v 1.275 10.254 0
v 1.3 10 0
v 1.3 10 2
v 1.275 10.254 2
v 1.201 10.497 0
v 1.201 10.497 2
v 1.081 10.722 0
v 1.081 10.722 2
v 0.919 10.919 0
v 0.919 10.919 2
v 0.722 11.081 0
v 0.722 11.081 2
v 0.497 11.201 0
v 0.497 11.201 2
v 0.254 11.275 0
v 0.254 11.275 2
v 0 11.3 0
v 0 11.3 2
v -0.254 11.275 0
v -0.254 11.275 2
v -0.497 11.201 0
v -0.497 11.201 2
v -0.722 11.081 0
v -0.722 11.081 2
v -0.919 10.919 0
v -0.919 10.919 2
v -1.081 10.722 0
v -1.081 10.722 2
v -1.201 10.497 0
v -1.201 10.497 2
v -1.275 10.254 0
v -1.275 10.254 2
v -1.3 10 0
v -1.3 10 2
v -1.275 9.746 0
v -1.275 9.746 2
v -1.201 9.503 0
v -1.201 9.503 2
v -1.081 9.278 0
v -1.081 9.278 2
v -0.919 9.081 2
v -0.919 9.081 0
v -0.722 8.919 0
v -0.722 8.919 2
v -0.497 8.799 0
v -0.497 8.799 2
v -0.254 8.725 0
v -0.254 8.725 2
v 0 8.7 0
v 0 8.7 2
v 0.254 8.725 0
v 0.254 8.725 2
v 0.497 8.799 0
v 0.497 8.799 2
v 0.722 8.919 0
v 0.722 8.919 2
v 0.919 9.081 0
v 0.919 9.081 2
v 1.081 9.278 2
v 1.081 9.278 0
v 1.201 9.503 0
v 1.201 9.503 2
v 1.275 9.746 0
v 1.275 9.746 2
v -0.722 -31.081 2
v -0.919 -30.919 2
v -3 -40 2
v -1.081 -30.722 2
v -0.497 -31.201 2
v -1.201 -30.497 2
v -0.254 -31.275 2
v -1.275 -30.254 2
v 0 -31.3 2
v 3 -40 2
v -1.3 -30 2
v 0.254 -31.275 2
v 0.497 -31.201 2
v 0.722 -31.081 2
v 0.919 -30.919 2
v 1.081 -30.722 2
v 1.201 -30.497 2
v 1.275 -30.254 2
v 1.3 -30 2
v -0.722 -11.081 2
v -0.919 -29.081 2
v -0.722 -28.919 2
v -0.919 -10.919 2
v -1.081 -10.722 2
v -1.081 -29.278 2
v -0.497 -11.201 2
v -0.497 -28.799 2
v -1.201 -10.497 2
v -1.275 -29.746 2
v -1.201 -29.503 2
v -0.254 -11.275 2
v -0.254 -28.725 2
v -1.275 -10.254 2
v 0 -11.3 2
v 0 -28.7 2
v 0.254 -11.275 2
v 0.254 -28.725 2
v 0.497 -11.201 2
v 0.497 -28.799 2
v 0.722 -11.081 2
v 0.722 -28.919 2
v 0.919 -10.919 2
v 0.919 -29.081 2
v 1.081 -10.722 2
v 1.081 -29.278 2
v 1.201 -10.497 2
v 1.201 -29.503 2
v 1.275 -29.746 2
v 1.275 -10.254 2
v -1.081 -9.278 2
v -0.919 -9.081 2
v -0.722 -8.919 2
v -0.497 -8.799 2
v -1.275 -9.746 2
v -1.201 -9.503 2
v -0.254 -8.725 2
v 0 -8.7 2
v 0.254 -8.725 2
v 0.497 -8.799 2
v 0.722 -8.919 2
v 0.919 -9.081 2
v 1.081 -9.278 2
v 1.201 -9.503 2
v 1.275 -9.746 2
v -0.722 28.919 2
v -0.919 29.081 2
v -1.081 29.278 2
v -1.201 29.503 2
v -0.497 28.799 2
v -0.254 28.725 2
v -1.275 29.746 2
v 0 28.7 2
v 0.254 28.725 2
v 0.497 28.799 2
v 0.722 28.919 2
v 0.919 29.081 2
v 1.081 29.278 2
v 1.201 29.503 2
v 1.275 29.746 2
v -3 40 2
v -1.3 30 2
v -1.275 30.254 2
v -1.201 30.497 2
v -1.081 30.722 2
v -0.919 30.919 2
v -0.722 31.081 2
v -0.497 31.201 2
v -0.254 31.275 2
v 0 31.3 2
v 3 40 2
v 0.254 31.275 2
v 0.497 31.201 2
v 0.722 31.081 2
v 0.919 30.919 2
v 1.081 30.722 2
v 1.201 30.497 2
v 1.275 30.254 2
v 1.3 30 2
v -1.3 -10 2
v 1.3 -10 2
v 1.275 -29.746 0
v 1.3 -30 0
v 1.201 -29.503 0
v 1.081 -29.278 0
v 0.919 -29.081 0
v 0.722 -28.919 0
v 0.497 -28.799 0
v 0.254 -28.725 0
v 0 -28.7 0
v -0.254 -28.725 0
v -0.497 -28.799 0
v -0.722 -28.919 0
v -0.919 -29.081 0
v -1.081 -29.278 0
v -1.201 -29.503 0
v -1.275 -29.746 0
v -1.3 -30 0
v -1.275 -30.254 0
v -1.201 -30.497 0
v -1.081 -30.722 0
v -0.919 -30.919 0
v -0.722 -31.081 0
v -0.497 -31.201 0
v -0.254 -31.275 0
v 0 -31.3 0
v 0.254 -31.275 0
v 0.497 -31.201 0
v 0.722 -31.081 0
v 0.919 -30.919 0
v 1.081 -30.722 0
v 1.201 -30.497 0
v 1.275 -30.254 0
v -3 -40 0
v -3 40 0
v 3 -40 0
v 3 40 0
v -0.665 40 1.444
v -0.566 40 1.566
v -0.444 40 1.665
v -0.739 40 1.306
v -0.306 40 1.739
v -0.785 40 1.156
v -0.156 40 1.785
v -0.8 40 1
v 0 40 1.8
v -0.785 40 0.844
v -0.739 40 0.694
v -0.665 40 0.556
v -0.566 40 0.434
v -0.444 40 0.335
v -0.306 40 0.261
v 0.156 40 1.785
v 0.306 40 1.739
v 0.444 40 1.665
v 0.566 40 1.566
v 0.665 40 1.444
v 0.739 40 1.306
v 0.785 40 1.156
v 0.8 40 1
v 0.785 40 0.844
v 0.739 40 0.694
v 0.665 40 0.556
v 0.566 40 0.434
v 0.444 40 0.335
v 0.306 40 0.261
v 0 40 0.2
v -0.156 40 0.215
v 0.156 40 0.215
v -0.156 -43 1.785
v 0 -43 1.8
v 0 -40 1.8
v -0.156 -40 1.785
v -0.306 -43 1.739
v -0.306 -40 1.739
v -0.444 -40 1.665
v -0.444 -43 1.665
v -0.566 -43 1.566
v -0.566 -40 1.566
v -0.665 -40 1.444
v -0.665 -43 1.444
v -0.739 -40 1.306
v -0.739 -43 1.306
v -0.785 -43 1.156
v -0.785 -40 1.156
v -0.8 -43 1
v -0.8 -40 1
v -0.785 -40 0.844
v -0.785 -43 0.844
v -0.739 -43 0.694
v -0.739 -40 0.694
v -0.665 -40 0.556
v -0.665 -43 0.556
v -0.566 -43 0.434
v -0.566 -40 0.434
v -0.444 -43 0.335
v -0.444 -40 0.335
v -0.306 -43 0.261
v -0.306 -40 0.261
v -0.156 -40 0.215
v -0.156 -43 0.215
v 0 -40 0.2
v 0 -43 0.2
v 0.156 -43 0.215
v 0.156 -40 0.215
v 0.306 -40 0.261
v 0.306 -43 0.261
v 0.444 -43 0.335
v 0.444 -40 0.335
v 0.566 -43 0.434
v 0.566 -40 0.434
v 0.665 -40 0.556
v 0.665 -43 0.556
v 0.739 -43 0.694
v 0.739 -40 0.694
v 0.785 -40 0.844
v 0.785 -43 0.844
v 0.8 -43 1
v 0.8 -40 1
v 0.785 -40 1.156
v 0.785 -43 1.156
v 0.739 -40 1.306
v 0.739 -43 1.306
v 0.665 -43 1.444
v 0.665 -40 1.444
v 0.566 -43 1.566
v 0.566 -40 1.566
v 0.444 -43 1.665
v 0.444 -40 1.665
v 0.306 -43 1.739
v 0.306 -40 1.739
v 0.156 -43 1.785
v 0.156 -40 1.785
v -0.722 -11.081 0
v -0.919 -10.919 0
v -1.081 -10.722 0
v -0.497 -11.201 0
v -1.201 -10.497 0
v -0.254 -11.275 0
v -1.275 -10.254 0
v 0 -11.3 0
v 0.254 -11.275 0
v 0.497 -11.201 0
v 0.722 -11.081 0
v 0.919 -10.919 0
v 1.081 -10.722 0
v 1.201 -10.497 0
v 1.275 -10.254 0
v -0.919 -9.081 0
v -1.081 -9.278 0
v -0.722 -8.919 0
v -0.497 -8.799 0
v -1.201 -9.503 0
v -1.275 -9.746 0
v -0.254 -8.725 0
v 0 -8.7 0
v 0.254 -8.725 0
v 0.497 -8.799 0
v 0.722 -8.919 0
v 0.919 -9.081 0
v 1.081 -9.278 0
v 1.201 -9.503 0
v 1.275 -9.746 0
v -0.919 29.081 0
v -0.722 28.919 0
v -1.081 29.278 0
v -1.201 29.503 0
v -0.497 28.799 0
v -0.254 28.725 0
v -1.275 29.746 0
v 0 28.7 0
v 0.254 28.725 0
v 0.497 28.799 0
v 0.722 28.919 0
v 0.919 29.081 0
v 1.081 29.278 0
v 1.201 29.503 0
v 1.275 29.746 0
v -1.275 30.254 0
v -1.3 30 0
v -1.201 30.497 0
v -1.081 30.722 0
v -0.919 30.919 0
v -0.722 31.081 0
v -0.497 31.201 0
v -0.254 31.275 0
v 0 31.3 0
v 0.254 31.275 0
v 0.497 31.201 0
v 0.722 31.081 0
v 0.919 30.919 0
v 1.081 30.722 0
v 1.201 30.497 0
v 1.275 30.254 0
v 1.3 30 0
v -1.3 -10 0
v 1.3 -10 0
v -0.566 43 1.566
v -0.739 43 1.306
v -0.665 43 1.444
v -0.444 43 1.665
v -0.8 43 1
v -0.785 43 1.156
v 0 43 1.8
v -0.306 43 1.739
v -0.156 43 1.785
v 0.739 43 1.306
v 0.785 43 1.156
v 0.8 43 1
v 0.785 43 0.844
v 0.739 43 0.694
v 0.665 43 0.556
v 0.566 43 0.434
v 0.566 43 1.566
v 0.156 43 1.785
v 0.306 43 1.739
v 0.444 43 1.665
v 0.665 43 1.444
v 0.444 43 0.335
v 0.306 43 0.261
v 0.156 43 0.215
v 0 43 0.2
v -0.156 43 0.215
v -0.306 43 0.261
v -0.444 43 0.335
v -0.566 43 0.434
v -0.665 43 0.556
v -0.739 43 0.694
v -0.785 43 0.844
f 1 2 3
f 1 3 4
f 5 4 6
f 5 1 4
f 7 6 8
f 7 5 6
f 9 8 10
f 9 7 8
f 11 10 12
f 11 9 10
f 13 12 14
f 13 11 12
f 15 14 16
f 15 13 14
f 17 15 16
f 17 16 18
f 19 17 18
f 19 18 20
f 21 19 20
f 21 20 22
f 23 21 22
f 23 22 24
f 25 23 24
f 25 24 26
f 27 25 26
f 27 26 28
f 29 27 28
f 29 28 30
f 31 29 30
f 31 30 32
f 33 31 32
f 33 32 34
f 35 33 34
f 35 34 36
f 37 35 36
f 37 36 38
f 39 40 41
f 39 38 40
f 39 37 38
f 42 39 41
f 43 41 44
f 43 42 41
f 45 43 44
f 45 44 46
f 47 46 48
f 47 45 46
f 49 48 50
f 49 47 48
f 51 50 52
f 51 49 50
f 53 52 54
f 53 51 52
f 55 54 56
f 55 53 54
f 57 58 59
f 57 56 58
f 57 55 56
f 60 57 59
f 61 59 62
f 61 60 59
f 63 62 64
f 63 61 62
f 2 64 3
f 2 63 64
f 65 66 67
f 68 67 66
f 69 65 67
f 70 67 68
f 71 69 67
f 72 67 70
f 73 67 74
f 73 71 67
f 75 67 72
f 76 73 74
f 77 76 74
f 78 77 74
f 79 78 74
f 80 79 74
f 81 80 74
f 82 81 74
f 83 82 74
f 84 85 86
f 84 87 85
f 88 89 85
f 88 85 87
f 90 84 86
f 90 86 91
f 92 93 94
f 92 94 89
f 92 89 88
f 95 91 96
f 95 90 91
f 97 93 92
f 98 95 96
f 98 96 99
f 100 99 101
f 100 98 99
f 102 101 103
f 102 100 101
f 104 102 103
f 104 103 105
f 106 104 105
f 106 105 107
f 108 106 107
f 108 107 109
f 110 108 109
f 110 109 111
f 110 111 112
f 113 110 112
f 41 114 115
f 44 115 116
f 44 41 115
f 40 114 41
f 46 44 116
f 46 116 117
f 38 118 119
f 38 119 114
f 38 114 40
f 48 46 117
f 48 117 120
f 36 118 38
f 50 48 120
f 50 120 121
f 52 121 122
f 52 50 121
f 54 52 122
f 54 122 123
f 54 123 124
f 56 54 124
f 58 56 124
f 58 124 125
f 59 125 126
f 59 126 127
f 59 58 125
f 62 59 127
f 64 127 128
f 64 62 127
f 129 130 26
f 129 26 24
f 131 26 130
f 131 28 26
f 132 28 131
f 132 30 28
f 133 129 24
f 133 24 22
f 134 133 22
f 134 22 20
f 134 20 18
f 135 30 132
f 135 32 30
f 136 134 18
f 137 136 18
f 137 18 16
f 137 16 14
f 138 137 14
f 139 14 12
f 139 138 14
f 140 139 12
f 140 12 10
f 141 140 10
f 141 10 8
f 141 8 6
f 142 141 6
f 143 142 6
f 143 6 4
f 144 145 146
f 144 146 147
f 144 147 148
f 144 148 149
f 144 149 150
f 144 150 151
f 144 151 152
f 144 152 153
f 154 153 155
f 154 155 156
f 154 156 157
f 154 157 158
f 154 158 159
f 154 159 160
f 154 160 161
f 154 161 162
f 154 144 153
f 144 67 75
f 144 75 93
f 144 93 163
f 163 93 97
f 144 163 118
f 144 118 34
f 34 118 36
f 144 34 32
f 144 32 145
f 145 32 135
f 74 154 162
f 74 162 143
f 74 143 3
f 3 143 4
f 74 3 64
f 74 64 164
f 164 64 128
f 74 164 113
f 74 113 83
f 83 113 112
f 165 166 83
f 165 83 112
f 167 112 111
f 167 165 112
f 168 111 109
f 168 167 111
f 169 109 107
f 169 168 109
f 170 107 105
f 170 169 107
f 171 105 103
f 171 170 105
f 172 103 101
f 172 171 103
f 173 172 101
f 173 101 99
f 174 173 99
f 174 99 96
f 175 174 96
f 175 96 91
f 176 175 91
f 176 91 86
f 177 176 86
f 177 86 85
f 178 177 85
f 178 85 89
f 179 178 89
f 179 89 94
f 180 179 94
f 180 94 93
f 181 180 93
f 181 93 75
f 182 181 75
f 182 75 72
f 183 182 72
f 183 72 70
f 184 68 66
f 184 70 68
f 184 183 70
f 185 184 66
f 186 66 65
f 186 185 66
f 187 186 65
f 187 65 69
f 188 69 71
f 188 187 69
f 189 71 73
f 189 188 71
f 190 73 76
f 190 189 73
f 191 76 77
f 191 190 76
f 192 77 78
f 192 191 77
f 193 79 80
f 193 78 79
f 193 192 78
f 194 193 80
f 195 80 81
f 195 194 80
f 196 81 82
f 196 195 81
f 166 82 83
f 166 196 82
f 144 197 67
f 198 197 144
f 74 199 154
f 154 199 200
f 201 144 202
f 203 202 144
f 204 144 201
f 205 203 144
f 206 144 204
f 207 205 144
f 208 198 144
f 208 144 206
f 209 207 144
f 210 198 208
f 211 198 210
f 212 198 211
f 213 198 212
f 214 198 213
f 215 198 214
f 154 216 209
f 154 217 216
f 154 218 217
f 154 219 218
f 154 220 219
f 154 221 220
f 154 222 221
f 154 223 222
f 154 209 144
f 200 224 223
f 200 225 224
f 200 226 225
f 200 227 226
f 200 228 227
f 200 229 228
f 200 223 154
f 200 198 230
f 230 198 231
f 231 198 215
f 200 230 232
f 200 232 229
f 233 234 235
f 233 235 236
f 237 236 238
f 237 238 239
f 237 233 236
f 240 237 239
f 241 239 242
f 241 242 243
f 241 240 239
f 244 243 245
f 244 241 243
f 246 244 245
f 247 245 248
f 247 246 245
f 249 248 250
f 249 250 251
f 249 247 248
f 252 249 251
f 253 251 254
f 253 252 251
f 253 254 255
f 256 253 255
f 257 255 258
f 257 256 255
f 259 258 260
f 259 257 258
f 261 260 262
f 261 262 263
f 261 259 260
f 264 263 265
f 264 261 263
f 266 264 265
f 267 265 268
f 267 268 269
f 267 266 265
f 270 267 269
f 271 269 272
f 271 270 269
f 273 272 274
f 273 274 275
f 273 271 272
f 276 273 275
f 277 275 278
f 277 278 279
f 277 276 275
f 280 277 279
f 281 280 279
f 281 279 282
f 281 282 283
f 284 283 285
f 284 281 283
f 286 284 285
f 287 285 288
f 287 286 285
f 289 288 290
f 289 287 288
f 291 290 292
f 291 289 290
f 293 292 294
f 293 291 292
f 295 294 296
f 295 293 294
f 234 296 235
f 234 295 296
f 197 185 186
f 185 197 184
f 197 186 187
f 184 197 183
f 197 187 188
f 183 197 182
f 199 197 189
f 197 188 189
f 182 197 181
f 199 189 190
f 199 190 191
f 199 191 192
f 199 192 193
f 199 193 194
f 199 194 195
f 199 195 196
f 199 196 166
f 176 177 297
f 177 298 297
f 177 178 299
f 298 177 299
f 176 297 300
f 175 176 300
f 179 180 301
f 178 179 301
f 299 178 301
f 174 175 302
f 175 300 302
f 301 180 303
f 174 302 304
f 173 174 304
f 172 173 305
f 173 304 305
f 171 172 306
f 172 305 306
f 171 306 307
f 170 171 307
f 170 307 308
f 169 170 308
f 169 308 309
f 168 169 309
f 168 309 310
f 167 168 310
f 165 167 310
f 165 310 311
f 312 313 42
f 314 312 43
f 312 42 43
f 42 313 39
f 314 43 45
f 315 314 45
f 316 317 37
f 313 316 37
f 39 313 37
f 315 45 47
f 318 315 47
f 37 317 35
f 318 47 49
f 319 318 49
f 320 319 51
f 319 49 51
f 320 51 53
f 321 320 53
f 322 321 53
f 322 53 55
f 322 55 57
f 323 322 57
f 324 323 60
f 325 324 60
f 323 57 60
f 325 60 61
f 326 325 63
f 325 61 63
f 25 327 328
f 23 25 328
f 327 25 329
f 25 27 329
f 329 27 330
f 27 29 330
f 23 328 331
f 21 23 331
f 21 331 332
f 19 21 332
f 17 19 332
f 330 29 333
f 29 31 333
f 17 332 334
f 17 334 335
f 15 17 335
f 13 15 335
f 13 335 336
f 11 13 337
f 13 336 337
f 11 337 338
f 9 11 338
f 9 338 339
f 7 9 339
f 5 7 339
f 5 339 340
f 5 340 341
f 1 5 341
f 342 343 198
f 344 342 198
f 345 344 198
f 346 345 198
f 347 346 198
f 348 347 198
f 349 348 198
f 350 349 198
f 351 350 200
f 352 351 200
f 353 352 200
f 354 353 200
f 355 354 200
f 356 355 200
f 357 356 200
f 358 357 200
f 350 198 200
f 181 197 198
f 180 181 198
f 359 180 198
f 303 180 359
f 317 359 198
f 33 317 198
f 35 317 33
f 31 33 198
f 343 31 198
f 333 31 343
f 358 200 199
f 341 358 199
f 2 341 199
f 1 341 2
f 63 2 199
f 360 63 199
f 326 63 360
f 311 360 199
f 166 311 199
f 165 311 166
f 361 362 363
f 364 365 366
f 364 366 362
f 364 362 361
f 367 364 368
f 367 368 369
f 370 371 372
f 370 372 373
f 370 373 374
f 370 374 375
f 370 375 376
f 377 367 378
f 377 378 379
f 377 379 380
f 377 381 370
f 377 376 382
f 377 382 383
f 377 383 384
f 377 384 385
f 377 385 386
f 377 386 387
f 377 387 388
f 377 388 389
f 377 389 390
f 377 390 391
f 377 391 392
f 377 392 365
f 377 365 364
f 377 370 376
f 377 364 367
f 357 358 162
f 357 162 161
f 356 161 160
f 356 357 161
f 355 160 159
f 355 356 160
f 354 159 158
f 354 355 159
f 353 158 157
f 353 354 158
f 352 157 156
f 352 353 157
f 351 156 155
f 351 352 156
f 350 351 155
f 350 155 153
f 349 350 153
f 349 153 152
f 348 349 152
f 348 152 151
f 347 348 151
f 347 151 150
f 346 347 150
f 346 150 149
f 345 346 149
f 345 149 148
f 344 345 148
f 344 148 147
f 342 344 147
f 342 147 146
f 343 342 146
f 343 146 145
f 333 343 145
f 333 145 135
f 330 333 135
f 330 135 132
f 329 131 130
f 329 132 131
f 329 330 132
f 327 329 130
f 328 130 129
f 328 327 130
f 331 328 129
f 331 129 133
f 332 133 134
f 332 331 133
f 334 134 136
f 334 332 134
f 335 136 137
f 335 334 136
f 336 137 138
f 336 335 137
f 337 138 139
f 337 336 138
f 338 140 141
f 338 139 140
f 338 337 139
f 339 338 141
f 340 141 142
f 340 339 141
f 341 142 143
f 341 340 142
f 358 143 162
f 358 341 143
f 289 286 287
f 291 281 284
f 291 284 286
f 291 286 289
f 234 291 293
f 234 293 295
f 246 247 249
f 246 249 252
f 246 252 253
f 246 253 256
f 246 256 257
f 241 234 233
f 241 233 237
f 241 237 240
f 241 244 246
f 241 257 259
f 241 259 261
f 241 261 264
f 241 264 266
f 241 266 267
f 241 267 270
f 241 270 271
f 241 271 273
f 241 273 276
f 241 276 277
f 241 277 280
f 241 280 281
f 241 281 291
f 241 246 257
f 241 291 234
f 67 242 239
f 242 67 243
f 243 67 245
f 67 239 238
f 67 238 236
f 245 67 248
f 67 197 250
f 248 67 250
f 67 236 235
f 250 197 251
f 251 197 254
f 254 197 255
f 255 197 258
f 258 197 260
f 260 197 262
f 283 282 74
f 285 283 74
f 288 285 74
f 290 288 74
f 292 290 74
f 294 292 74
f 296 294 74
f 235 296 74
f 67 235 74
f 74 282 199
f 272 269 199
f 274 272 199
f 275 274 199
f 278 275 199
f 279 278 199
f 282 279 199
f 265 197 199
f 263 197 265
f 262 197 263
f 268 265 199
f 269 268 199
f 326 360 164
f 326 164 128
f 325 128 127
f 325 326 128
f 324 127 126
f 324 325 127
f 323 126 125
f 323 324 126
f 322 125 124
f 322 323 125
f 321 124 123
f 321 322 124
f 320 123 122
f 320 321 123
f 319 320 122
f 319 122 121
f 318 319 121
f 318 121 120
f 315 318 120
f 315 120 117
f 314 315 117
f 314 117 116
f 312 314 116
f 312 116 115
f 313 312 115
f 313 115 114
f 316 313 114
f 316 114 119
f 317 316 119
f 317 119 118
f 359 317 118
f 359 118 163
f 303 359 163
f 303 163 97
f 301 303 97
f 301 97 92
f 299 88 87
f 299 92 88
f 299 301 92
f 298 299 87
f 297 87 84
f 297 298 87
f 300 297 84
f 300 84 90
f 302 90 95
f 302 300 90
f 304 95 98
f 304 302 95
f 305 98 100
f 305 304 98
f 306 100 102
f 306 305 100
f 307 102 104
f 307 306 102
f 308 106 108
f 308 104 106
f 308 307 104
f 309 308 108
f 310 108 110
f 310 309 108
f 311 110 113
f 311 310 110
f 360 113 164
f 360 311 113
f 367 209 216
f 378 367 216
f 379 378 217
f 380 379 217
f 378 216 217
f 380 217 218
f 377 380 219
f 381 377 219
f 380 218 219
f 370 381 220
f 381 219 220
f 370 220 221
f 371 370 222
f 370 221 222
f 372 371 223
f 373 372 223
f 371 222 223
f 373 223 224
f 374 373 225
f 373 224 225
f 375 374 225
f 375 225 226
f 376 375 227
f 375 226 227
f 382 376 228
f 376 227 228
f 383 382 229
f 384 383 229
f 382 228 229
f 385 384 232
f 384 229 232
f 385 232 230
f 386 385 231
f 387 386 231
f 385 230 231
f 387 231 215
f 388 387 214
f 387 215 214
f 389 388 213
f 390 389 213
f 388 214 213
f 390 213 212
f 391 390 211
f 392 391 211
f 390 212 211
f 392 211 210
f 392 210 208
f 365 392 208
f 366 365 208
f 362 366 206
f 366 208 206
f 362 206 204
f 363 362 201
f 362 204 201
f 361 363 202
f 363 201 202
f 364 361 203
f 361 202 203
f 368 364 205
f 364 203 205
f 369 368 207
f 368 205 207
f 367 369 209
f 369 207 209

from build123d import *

# Parameters (mm, degrees)
SKETCH1_W             = 6
SKETCH1_H             = 80
ROD_BAR_DEPTH         = 2
LINK_HOLES_DEPTH      = 41.162171256
LINK_HOLES_DEPTH_BACK = 41.162171256
SKETCH2_R             = 1.3
SKETCH3_R             = 0.8
SMA_SPRING_PEG_DEPTH  = 3
BIAS_SPRING_PEG_START = 3
SKETCH4_R             = 0.8
BIAS_SPRING_PEG_DEPTH = 3


with BuildPart() as part:
    # Sketch1 → Rod_Bar (new body)
    with BuildSketch(Plane.XY):
        Rectangle(SKETCH1_W, SKETCH1_H)
    extrude(amount=ROD_BAR_DEPTH)

    # Sketch2 → Link_Holes (cut, two sides: drawn at the far end of the back side and taken through both)
    with BuildSketch(Plane.XY.offset(-LINK_HOLES_DEPTH_BACK)):
        with Locations((0, -30)):
            Circle(SKETCH2_R)
        with Locations((0, -10)):
            Circle(SKETCH2_R)
        with Locations((0, 10)):
            Circle(SKETCH2_R)
        with Locations((0, 30)):
            Circle(SKETCH2_R)
    extrude(amount=LINK_HOLES_DEPTH + LINK_HOLES_DEPTH_BACK, mode=Mode.SUBTRACT)

    # Sketch3 → SMA_Spring_Peg (add)
    with BuildSketch(Plane(origin=(0, 40, 0), x_dir=(1, 0, 0), z_dir=(0, 1, 0))):
        with Locations(Location((0, -1, 0), (0, 0, 270))):
            Circle(SKETCH3_R)
    extrude(amount=SMA_SPRING_PEG_DEPTH)

    # Sketch4 → Bias_Spring_Peg (add)
    with BuildSketch(Plane.XZ.offset(40).offset(BIAS_SPRING_PEG_START)):
        with Locations(Location((0, 1, 0), (0, 0, 90))):
            Circle(SKETCH4_R)
    extrude(amount=-BIAS_SPRING_PEG_DEPTH)


solid = part.part
